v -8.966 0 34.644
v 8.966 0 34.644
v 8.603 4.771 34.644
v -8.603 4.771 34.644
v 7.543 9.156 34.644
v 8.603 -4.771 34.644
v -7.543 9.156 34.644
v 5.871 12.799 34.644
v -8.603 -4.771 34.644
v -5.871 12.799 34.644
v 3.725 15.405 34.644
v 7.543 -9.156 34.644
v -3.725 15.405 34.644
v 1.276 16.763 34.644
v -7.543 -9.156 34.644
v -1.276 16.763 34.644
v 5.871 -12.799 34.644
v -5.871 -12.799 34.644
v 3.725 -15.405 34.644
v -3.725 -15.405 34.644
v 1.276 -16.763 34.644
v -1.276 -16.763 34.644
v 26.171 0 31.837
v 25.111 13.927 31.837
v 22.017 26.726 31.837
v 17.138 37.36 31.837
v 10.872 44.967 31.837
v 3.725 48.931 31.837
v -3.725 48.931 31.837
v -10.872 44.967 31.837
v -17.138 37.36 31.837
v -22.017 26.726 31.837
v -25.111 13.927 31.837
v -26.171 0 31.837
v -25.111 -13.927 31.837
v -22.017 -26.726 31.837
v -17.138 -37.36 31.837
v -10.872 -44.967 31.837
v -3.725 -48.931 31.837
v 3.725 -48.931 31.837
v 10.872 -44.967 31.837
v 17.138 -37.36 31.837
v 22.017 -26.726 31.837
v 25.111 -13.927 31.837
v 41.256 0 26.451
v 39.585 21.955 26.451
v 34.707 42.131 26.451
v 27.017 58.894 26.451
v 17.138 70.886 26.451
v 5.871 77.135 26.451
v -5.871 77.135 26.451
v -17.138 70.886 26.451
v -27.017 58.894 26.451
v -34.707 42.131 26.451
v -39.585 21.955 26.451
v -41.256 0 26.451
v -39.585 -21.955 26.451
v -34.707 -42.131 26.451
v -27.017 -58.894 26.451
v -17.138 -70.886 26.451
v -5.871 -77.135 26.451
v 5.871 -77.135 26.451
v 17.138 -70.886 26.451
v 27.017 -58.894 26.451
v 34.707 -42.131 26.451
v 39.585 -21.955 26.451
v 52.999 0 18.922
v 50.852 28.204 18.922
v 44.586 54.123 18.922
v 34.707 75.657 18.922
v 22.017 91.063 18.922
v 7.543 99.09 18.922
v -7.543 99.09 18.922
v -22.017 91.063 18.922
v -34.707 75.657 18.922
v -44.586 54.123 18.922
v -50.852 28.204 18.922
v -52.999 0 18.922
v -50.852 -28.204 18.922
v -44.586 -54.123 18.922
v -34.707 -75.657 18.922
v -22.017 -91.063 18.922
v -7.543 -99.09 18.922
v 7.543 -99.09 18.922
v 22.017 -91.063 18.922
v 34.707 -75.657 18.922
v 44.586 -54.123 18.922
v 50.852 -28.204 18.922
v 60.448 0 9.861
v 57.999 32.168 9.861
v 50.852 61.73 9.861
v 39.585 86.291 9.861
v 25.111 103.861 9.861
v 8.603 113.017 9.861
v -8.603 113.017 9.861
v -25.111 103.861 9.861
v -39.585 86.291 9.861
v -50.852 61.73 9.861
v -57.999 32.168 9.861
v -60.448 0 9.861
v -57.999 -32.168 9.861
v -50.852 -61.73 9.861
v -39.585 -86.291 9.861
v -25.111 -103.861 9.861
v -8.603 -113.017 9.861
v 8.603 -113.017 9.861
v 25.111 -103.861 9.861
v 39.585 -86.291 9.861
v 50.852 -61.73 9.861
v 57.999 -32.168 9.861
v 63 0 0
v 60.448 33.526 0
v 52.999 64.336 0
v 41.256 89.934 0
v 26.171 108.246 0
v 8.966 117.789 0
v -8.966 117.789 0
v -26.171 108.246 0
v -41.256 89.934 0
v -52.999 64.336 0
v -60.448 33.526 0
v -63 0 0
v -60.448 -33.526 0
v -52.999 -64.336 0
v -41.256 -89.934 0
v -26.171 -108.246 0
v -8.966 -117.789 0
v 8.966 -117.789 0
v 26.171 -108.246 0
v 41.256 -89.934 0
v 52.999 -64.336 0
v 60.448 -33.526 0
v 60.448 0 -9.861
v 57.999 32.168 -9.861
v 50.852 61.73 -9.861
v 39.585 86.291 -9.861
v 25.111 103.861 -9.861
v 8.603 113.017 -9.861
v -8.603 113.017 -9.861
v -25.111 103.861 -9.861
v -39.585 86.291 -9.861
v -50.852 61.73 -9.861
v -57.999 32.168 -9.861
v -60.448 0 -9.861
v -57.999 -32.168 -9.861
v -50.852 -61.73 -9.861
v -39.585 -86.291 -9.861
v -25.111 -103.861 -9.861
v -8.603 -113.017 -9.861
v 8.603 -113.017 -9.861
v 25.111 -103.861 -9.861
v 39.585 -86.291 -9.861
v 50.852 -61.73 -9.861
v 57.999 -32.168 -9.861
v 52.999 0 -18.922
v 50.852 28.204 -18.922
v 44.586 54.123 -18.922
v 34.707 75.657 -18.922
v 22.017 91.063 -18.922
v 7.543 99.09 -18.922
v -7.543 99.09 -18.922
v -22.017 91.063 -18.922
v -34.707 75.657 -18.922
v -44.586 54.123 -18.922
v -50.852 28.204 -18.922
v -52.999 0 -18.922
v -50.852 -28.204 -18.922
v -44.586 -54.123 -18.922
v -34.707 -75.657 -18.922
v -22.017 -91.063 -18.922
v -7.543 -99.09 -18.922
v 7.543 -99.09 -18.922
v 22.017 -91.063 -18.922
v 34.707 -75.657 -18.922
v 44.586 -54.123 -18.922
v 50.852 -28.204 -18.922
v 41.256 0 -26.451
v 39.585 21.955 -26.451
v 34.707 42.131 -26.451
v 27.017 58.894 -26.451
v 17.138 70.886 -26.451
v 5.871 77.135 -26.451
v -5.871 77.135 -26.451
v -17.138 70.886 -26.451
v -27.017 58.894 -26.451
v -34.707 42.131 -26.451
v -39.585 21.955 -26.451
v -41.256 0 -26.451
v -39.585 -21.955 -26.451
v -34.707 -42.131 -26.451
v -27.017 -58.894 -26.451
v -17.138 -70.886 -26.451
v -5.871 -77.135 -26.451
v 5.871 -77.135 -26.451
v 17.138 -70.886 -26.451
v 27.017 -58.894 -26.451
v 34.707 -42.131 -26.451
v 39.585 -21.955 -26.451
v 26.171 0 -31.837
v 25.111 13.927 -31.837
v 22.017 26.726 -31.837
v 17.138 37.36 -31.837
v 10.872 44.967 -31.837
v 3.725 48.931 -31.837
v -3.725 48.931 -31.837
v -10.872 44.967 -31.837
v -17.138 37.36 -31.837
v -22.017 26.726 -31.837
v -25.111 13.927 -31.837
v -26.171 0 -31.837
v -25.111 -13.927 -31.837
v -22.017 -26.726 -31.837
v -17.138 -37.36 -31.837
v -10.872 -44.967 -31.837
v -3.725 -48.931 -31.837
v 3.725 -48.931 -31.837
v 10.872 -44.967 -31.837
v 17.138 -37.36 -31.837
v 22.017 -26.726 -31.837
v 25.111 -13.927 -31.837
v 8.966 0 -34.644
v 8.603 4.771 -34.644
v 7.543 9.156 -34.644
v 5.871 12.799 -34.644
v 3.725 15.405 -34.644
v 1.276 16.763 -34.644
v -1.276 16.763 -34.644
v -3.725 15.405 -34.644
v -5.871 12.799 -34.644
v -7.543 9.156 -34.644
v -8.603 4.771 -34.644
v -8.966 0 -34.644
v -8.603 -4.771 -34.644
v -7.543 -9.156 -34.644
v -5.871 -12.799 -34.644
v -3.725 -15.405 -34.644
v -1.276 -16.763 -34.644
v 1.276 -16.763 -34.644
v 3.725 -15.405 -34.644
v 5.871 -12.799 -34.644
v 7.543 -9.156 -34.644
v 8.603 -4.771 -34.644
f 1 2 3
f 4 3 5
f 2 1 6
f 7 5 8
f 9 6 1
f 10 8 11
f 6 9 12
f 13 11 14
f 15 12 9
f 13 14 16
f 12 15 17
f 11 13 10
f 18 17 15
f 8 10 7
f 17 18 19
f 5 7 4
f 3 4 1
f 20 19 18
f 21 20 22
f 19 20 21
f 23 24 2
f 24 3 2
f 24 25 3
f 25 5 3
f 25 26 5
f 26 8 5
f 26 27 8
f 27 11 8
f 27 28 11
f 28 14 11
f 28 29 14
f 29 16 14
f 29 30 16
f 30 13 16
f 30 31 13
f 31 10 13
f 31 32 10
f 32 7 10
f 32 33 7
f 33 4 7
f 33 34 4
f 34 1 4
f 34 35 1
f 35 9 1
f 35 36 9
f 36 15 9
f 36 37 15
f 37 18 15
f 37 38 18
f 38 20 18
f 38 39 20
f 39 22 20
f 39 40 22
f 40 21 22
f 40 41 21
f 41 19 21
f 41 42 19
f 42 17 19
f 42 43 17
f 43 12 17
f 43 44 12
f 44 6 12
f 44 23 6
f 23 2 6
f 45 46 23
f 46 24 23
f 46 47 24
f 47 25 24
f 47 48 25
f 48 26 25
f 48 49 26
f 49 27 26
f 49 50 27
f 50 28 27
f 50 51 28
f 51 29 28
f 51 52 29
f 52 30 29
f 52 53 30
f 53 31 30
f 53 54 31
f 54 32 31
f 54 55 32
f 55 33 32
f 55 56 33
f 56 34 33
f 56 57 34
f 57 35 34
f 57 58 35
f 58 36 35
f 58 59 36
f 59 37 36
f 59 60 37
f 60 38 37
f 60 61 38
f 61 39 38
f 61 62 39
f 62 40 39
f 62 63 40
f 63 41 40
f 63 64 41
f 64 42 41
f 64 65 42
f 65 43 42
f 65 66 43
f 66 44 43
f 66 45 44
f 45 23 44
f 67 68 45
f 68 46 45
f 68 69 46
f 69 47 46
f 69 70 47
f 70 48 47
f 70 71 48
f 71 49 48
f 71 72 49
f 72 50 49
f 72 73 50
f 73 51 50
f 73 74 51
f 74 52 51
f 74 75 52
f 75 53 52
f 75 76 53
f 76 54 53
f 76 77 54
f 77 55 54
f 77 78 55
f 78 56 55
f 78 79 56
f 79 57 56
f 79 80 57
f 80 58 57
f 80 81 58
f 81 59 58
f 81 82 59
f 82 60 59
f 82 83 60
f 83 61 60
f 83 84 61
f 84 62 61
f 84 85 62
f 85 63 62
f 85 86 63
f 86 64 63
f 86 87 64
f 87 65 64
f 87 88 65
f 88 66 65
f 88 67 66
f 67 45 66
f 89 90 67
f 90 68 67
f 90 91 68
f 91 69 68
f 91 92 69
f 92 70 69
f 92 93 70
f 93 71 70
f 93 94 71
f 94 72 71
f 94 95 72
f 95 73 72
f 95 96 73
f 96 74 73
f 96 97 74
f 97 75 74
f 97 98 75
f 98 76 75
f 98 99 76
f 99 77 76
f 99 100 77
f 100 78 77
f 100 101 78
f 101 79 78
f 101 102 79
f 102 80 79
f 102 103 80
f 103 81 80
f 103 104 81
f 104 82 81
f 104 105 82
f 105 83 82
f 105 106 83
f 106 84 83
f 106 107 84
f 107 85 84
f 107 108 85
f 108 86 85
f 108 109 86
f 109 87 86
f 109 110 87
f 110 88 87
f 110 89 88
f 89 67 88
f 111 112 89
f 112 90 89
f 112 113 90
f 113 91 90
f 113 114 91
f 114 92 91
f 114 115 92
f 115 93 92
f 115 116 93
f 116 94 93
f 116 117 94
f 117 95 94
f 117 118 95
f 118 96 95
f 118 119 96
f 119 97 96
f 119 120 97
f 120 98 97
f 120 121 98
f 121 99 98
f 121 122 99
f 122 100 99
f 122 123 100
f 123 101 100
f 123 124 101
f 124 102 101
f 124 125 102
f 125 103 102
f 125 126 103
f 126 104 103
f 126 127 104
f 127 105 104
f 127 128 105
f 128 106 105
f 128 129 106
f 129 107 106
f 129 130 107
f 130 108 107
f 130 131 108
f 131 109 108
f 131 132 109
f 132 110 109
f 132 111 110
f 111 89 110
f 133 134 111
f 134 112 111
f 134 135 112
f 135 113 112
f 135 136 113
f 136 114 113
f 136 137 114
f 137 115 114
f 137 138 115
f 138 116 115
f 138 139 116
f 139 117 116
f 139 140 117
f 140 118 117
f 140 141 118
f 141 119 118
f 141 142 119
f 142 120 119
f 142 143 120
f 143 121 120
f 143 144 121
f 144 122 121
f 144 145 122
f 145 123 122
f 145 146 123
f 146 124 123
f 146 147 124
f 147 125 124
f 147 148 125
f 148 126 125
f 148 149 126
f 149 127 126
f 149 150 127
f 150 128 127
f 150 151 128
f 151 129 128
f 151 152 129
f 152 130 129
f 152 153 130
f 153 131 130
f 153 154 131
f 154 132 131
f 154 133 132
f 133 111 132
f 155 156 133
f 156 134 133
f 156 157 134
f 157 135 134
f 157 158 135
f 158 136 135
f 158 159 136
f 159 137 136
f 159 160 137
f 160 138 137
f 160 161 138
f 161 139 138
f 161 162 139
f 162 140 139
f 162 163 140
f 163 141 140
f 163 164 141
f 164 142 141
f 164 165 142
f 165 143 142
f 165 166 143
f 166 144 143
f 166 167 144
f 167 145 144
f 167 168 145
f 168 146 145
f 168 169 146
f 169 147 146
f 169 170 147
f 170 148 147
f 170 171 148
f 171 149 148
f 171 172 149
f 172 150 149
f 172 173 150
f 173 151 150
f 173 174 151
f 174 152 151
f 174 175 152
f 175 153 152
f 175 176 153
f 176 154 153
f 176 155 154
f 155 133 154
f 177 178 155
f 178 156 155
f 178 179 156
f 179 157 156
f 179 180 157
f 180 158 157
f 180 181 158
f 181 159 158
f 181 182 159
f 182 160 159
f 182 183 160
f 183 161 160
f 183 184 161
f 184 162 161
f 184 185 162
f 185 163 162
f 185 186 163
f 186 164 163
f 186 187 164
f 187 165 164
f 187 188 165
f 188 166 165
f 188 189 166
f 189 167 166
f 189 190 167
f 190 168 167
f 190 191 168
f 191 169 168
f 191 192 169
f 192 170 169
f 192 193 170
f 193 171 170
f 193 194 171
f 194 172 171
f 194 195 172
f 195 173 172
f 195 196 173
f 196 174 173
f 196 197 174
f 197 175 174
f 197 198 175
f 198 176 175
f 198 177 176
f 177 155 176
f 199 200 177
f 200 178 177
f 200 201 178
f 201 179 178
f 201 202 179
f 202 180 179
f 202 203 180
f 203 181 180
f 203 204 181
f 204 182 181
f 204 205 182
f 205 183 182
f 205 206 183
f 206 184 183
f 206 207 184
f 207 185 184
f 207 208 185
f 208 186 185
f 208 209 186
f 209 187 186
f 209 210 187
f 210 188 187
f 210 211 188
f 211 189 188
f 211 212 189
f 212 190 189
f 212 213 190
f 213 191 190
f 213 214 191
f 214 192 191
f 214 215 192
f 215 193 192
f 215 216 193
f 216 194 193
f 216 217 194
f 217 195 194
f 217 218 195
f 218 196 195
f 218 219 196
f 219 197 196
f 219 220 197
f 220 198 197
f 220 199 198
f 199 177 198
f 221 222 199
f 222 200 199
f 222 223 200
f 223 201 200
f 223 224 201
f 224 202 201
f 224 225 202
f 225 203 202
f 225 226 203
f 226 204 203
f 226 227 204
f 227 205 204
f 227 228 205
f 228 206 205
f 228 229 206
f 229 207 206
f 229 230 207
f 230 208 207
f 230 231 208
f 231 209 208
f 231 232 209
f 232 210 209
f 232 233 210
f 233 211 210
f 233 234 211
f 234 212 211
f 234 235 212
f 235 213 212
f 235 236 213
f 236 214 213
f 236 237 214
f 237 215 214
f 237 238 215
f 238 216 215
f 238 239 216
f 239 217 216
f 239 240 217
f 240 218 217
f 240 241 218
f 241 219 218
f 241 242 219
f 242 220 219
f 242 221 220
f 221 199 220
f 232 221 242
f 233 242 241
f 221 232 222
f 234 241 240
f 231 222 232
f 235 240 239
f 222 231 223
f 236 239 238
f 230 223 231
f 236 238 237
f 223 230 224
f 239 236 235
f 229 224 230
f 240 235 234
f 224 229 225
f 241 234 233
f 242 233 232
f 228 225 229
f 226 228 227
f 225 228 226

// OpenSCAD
// Generated by SolidPython 1.0.1 on 2020-07-29 00:46:49


scale(v = [9, 17, 5]) {
	sphere(r = 7);
}
/***********************************************
*********      SolidPython code:      **********
************************************************
 
# import packages: SolidPython
from solid import *
from solid.utils import *
from itertools import chain, combinations, permutations


class Resize:

    def __init__(self, scad_file):
        self.scad_file = scad_file
        #self.scad_file = import_scad(scad_file)
        # cone/cylinder param:
        self.r1 = 0
        self.r2 = 0
        self.h = 0
        # rectangular prism param:
        self.w = 0
        self.l = 0
        # ellipse param:
        self.r = 0

    # import OpenScad code (file name corresponds to shape)


    # classify shape + parameters
    def assign(self, param1, param2, param3):
        if self.scad_file == 'cone.scad':
            self.r1 = param1
            self.r2 = param2
            self.h = param3
        elif self.scad_file == 'cylinder.scad':
            self.r1 = param1
            self.r2 = param2
            self.h = param3
        elif self.scad_file == 'rectangularPrism.scad':
            self.h = param1
            self.l = param2
            self.w = param3
        else:
            self.r = param1
            self.h = param2

    # resize parameters
    def iterate(self):
        x = range(3, 20, 2)
        i = 1
        if self.scad_file == 'cone.scad':
            tempList = list(permutations(x, 2))
            for temp in tempList:
                param1 = temp[0]
                param2 = temp[1]
                filepath = 'produced_scad_files/' + 'cone' + str(param1) + '_' + str(param2) + '_' + '.scad'
                scad_render_to_file(cylinder(h=param1, r1=param2, r2=0), filepath)

        elif self.scad_file == 'cylinder.scad':
            tempList = list(permutations(x, 3))
            for temp in tempList:
                param1 = temp[0]
                param2 = temp[1]
                filepath = 'produced_scad_files/' + 'cylinder' + str(param1) + '_' + str(param2) + '_' + '.scad'
                scad_render_to_file(cylinder(h=param1, r1=param2, r2=param2), filepath)

        elif self.scad_file == 'rectangularPrism.scad':
            tempList = list(permutations(x, 3))
            for temp in tempList:
                param1 = temp[0]
                param2 = temp[1]
                param3 = temp[2]
                filepath = 'produced_scad_files/' + 'rectangularPrism' + str(param1) + '_' + str(param2) + '_' + str(
                    param3) + '.scad'
                scad_render_to_file(cube(size=(param1, param2, param3)), filepath)

        elif self.scad_file == 'ellipse.scad':
            tempList = list(permutations(x, 4))
            for temp in tempList:
                param1 = temp[0]
                param2 = temp[1]
                param3 = temp[2]
                param4 = temp[3]
                filepath = 'produced_scad_files/' + 'ellipse' + str(param1) + '_' + str(param2) + '_' + str(param3) + '_' + str(param4) + '.scad'
                scad_render_to_file(scale([param1, param2, param3])(sphere(r=param4)), filepath)

    def render_to_scadfile(self):
        scad_render_to_file(scad, 'example.scad') 
 
************************************************/
